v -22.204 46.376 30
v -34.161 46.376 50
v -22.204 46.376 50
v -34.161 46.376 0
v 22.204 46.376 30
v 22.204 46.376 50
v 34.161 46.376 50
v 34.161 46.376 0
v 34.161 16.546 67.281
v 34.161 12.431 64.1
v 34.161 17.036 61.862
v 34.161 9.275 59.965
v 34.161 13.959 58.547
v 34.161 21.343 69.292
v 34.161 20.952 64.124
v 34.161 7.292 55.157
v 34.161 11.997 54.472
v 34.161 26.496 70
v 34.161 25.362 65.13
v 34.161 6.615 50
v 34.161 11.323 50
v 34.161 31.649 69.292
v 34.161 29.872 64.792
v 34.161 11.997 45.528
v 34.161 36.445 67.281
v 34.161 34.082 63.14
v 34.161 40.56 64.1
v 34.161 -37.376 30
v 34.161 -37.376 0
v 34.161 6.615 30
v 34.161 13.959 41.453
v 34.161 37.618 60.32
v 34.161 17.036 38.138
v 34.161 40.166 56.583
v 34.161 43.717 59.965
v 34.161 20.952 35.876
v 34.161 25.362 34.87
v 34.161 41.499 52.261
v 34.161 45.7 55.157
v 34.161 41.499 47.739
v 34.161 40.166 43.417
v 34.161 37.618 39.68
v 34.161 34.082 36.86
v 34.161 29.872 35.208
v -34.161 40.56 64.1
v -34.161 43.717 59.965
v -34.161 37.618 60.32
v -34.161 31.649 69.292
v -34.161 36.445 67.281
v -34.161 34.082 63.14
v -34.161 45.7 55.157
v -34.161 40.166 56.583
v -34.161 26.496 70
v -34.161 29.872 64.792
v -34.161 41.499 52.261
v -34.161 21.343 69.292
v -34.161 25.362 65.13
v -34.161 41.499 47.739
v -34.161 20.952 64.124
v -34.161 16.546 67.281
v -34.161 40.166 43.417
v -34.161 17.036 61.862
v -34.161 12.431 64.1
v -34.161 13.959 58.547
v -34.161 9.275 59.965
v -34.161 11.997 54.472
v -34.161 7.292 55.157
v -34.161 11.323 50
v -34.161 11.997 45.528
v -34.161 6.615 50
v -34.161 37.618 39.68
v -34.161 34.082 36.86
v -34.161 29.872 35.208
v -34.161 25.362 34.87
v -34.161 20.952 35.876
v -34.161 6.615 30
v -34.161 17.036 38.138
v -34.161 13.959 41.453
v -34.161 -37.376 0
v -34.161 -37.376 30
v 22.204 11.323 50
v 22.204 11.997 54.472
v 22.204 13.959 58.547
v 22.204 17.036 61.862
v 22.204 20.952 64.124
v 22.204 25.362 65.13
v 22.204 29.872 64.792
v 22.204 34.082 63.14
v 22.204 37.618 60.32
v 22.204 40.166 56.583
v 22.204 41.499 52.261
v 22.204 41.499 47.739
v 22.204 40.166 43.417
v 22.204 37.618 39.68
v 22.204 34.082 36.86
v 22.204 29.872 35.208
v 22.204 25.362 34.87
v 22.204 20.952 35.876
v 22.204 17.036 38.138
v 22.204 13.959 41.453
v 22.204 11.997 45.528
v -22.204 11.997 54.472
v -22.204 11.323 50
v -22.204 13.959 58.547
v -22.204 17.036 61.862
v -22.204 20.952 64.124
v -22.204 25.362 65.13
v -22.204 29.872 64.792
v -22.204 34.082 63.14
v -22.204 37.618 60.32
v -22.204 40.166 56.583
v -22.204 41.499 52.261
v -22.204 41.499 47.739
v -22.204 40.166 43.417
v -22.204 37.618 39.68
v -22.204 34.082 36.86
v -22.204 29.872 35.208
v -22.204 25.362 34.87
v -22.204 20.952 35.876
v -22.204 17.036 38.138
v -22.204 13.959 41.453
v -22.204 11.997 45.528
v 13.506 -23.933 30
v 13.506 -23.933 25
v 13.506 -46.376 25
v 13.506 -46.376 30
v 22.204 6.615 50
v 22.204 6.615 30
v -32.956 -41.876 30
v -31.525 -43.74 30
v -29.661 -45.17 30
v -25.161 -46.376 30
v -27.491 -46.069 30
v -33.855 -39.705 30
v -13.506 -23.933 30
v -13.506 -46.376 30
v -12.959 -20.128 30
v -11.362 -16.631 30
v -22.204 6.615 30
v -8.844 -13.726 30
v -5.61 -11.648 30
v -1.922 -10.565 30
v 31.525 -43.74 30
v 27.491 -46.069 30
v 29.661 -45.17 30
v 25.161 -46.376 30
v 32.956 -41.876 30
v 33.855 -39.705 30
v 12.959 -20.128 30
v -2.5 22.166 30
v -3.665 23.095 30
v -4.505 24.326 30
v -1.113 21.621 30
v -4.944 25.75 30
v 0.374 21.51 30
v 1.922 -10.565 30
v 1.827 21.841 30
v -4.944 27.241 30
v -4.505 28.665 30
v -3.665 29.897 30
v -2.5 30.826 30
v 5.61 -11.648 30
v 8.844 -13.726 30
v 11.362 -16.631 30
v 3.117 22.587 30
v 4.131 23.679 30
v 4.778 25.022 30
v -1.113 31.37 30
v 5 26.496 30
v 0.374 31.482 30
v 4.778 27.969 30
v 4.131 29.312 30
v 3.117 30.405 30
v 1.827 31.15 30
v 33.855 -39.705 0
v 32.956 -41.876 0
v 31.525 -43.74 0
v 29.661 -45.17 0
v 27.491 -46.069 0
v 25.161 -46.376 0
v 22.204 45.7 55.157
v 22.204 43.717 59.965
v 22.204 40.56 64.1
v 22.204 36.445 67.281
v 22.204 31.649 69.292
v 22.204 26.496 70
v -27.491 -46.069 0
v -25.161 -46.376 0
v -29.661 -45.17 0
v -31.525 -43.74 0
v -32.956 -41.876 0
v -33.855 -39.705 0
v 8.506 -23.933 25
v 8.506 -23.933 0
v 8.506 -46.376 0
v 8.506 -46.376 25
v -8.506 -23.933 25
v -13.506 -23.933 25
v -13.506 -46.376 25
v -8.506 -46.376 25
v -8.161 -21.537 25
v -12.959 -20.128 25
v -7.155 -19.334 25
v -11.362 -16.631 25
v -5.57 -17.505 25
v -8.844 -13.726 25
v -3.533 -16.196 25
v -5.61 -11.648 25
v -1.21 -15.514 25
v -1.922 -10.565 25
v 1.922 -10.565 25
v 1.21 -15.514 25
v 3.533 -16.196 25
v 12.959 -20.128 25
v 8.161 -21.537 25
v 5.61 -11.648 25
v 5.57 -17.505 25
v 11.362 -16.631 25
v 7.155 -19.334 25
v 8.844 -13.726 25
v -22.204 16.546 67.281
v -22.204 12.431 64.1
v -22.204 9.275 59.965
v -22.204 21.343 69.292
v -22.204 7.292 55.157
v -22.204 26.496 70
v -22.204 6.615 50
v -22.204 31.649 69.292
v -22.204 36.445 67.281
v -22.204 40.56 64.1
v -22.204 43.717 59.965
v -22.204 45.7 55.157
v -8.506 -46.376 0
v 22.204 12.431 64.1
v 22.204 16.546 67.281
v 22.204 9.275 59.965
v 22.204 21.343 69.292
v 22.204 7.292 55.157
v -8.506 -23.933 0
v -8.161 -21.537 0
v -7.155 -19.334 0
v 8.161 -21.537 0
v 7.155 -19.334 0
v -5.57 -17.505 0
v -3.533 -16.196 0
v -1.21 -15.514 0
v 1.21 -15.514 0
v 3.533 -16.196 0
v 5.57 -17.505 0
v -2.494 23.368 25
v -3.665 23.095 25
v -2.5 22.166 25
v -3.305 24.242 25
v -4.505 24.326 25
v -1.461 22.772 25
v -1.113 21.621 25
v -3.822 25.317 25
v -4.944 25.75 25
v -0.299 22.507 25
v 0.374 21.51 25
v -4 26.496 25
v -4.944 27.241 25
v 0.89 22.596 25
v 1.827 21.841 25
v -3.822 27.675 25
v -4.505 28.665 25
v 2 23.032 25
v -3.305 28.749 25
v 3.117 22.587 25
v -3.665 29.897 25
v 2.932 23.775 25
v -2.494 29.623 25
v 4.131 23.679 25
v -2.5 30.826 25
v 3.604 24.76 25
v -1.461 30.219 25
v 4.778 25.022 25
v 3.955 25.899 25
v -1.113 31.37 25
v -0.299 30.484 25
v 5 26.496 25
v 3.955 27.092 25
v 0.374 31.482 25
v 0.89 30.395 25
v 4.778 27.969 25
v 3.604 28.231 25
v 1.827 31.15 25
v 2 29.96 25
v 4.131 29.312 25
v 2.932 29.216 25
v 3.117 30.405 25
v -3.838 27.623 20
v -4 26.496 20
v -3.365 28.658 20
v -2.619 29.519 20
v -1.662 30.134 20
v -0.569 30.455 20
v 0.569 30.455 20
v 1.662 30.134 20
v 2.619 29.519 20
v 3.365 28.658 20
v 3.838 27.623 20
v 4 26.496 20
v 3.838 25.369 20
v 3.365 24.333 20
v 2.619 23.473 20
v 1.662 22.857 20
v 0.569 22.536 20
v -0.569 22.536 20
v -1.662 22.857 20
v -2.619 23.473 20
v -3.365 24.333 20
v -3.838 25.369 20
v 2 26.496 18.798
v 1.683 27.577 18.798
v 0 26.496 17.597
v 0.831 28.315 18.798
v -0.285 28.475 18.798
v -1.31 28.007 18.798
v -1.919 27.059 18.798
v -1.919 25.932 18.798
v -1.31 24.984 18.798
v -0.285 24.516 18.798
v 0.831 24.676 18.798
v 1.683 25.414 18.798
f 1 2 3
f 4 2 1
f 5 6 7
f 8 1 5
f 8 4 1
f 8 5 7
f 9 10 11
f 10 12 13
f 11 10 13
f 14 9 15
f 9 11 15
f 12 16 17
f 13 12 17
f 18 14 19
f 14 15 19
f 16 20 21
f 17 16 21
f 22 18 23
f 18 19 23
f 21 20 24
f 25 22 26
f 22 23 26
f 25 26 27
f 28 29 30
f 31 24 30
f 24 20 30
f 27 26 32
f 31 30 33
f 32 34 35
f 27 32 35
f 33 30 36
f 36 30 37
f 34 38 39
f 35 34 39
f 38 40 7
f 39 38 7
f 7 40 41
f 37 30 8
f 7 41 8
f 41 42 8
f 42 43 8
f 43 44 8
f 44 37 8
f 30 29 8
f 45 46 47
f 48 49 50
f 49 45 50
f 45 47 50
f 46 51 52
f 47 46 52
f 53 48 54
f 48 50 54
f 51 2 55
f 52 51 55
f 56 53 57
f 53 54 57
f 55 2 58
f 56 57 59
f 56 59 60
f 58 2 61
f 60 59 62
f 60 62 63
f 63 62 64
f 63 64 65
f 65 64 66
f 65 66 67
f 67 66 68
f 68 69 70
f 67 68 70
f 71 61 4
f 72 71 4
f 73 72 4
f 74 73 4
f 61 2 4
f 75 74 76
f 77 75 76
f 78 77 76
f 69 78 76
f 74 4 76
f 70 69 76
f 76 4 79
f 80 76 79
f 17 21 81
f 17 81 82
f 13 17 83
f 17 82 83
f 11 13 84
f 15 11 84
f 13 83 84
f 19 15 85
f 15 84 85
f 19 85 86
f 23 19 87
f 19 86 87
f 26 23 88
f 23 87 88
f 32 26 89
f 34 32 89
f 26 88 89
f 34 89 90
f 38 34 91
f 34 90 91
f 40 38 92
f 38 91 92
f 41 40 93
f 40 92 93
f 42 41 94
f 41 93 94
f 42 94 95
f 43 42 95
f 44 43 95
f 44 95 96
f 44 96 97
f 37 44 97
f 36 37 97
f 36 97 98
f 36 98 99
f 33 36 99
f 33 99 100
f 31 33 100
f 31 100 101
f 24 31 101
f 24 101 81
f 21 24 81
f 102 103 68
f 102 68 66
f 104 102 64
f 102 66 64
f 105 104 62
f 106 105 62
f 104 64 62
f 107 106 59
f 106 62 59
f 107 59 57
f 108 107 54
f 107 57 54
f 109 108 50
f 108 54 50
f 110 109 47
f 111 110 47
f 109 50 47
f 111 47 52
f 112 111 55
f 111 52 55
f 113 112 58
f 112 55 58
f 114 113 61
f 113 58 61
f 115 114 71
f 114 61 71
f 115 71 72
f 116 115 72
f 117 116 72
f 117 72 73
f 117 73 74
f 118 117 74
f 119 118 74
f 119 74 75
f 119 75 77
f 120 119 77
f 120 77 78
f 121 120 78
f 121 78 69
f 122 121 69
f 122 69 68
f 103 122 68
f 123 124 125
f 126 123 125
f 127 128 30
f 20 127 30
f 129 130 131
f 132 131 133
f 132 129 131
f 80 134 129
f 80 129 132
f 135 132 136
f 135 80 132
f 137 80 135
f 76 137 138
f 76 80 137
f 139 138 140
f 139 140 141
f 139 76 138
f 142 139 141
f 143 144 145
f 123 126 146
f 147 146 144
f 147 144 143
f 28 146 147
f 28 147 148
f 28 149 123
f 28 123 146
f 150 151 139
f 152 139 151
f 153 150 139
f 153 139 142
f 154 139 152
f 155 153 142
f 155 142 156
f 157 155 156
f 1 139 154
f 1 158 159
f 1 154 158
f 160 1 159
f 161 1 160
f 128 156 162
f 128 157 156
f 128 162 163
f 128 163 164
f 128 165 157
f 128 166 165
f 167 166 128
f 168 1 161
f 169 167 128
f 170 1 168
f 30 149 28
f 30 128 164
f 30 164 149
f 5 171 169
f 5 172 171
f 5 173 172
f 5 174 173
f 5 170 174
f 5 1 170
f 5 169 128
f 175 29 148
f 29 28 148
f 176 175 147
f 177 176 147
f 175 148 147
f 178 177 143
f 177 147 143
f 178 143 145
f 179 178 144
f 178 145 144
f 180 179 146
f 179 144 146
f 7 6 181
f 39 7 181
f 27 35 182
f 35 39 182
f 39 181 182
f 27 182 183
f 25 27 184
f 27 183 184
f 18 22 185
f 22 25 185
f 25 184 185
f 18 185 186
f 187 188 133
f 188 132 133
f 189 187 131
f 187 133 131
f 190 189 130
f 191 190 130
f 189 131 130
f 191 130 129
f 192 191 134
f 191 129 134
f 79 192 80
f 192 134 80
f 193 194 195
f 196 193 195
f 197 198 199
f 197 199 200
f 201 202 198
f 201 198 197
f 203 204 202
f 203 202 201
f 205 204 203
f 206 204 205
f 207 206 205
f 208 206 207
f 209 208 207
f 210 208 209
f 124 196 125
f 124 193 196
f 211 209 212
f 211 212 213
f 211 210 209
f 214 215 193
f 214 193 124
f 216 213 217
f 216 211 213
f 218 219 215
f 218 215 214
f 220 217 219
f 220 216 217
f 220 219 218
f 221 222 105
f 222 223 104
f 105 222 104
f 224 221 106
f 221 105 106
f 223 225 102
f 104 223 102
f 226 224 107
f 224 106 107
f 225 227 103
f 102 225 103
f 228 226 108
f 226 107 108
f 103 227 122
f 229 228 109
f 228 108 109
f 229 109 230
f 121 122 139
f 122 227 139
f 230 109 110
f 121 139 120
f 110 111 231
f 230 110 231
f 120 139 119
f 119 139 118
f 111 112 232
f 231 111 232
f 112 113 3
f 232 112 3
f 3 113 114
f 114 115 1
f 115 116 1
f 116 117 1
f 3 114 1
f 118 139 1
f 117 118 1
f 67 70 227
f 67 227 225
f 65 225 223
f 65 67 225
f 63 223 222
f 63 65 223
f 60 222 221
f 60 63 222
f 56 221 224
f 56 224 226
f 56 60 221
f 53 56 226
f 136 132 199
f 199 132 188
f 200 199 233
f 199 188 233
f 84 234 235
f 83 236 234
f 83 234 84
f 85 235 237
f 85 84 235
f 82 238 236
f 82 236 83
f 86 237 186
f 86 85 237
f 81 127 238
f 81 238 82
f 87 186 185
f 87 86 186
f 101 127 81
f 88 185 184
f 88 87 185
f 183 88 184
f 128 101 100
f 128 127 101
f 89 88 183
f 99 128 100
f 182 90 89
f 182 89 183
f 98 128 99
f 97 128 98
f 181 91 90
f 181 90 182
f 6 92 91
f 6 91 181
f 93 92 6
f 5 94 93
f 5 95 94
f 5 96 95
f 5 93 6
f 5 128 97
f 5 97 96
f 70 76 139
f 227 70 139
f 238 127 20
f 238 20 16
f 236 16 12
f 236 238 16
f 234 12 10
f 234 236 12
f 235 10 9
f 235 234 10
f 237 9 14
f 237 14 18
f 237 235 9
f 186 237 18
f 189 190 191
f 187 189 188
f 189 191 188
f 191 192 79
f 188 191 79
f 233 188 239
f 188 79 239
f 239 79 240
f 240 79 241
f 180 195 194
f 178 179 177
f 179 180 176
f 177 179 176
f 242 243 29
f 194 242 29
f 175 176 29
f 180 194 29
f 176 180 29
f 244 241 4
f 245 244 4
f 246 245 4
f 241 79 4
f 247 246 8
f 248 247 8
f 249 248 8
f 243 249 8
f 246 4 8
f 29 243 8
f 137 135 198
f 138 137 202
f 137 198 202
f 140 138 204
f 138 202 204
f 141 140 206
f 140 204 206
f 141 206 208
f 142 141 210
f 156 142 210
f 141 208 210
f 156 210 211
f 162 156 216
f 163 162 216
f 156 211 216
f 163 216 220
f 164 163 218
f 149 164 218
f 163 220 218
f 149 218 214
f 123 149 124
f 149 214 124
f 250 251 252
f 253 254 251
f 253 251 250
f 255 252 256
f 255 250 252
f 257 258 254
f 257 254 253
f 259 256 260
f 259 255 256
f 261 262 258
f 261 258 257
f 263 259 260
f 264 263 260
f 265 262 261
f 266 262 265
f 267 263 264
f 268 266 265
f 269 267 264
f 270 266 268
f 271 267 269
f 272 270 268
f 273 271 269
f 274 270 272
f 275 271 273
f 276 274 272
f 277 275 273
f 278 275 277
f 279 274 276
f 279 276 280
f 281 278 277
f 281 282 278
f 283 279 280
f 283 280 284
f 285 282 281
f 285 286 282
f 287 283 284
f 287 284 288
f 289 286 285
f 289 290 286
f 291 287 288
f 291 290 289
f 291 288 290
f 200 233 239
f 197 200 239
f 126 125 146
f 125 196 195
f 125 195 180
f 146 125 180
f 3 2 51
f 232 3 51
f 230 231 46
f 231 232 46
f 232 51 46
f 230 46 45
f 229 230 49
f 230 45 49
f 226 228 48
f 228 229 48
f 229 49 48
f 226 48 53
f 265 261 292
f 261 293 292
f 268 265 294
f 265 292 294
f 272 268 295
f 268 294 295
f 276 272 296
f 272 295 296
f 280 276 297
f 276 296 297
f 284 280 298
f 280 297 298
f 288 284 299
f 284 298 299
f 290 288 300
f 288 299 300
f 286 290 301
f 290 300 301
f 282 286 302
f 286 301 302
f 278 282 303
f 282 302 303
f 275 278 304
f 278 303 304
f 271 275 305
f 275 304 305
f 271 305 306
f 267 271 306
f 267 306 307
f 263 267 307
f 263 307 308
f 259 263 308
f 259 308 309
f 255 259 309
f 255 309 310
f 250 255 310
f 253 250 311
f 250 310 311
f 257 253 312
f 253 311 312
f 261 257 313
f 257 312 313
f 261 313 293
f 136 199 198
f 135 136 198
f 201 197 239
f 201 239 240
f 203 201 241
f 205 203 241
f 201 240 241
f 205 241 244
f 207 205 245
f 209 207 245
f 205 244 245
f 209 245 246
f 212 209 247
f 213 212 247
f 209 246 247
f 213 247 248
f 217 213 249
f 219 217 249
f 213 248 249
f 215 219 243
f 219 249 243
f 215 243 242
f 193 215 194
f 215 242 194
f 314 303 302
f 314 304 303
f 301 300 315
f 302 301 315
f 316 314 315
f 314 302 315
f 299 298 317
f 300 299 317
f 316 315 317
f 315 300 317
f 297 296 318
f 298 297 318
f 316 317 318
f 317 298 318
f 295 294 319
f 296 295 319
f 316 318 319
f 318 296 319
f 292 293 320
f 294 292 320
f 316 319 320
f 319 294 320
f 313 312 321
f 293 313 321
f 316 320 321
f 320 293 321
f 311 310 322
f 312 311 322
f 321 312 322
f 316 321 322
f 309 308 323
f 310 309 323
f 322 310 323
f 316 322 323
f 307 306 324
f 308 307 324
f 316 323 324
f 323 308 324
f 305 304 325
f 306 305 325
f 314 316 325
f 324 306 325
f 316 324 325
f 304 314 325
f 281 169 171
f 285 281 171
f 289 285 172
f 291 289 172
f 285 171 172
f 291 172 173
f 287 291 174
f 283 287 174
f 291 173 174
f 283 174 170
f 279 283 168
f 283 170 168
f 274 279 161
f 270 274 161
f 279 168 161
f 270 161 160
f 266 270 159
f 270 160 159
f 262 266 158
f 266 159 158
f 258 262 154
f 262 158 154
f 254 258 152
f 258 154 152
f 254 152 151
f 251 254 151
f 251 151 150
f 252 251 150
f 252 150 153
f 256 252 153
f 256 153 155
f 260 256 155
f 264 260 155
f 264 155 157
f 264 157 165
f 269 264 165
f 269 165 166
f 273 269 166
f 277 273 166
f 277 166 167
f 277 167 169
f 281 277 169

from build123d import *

# Parameters (mm, degrees)
F1_DEPTH        = 25
F2_DEPTH        = 30
F3_W            = 11.9576826692
F3_H            = 39.7608936764
F4_DEPTH        = 40
F5_R            = 15.1725757167
F6_DEPTH        = 68.3238299022
F7_T1_DEPTH     = 111.9576826692
F7_T3_DEPTH     = 111.9576826692
F8_R            = 9
F10_D           = 8
F10_DEPTH       = 10
F10_CBORE_D     = 10
F10_CBORE_DEPTH = 5
F10_TIP         = 2.4034424761


# Not quite as in the source:
# - a fillet or chamfer that OpenCascade refuses, or shapes differently, is made with other operations: its cross-section is extruded or revolved along the edge and cut away or added


with BuildPart() as f1:
    # F0 (on Top) → F1 (new body)
    with BuildSketch(Plane.XY):
        with BuildLine():
            Line((8.5056748986, -46.3761053979), (13.5056748986, -46.3761053979))
            Line((13.5056748986, -46.3761053979), (13.5056748986, -23.932851851))
            ThreePointArc((13.5056748986, -23.932851851), (0, -10.4271769524), (-13.5056748986, -23.932851851))
            Line((-13.5056748986, -23.932851851), (-13.5056748986, -46.3761053979))
            Line((-13.5056748986, -46.3761053979), (-8.5056748986, -46.3761053979))
            Line((-8.5056748986, -46.3761053979), (-8.5056748986, -23.932851851))
            ThreePointArc((-8.5056748986, -23.932851851), (0, -15.4271769524), (8.5056748986, -23.932851851))
            Line((8.5056748986, -23.932851851), (8.5056748986, -46.3761053979))
        make_face()
    extrude(amount=F1_DEPTH)

    # F0 (on Top) → F2 (join)
    with BuildSketch(Plane.XY):
        with BuildLine():
            Line((34.1614149511, -46.3761053979), (34.1614149511, 46.3761053979))
            Line((34.1614149511, 46.3761053979), (-34.1614149511, 46.3761053979))
            Line((-34.1614149511, 46.3761053979), (-34.1614149511, -46.3761053979))
            Line((-34.1614149511, -46.3761053979), (-13.5056748986, -46.3761053979))
            Line((-13.5056748986, -46.3761053979), (-13.5056748986, -23.932851851))
            ThreePointArc((-13.5056748986, -23.932851851), (0, -10.4271769524), (13.5056748986, -23.932851851))
            Line((13.5056748986, -23.932851851), (13.5056748986, -46.3761053979))
            Line((13.5056748986, -46.3761053979), (34.1614149511, -46.3761053979))
        make_face()
    extrude(amount=F2_DEPTH)

    # F3 (on face) → F4 (join)
    with BuildSketch(Plane.XY.offset(30)):
        with Locations((28.1825736165, 26.4956585597)):
            Rectangle(F3_W, F3_H)
        with Locations((-28.1825736165, 26.4956585597)):
            Rectangle(F3_W, F3_H)
    extrude(amount=F4_DEPTH)

    # F5 (on face) → F6 (cut, through all)
    with BuildSketch(Plane(origin=(-34.1614149511, 0, 0), x_dir=(0, -1, 0), z_dir=(-1, 0, 0))):
        with Locations((-26.4956585597, 50)):
            Circle(F5_R)
    extrude(amount=-F6_DEPTH, mode=Mode.SUBTRACT)

    # F7: fillet of radius 20 on 4 edges, made by hand

    # F7_s2 → F7_t1 (cut)
    with BuildSketch(Plane.YZ.offset(-84.1614149511)):
        with BuildLine():
            ThreePointArc((6.6152117215, 50), (12.4730760978, 64.1421356237), (26.6152117215, 70))
            Line((26.6152117215, 70), (6.6152117215, 70))
            Line((6.6152117215, 70), (6.6152117215, 50))
        make_face()
        with BuildLine():
            ThreePointArc((46.3761053979, 50), (40.5182410217, 64.1421356237), (26.3761053979, 70))
            Line((26.3761053979, 70), (46.3761053979, 70))
            Line((46.3761053979, 70), (46.3761053979, 50))
        make_face()
    extrude(amount=F7_T1_DEPTH, mode=Mode.SUBTRACT)

    # F7_s4 → F7_t3 (cut)
    with BuildSketch(Plane.YZ.offset(-27.7962677181)):
        with BuildLine():
            ThreePointArc((6.6152117215, 50), (12.4730760978, 64.1421356237), (26.6152117215, 70))
            Line((26.6152117215, 70), (6.6152117215, 70))
            Line((6.6152117215, 70), (6.6152117215, 50))
        make_face()
        with BuildLine():
            ThreePointArc((46.3761053979, 50), (40.5182410217, 64.1421356237), (26.3761053979, 70))
            Line((26.3761053979, 70), (46.3761053979, 70))
            Line((46.3761053979, 70), (46.3761053979, 50))
        make_face()
    extrude(amount=F7_T3_DEPTH, mode=Mode.SUBTRACT)

    # F8
    f8_edges = [f1.edges().sort_by_distance(p)[0] for p in [
        (34.161415, -46.376105, 15),
        (-34.161415, -46.376105, 15),
    ]]
    fillet(f8_edges, radius=F8_R)

    # F10
    with Locations(Plane.XY.offset(30)):
        with Locations((0, 26.4956585597)):
            CounterBoreHole(F10_D / 2, F10_CBORE_D / 2, F10_CBORE_DEPTH, depth=F10_DEPTH)
            with Locations((0, 0, -(F10_DEPTH + F10_TIP / 2))):  # 118° drill point
                Cone(0, F10_D / 2, F10_TIP, mode=Mode.SUBTRACT)


solid = f1.part
